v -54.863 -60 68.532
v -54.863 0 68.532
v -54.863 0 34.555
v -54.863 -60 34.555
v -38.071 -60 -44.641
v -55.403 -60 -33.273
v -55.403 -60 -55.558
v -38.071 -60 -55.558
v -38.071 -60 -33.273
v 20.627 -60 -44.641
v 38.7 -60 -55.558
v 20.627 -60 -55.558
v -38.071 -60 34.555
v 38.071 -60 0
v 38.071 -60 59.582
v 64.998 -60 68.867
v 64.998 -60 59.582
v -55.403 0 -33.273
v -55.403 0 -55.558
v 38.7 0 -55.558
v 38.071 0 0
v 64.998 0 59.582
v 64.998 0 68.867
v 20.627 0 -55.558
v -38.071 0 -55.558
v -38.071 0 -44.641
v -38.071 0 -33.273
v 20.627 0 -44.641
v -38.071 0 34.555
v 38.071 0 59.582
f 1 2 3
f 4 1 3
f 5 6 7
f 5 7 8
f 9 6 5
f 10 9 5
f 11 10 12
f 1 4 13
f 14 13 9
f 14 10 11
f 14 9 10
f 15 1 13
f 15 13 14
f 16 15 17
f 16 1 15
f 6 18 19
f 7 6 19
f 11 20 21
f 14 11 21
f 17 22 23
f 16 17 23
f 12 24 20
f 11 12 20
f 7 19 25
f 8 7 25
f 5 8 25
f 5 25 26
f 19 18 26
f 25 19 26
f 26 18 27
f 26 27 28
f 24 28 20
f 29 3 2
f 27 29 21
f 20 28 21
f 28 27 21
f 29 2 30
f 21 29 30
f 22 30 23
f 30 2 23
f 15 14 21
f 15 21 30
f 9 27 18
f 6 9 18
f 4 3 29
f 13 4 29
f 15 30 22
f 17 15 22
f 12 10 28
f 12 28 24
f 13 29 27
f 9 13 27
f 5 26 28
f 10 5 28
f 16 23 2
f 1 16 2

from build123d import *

# Parameters (mm, degrees)
F1_DEPTH = 60


with BuildPart() as f1:
    # F0 (on Front) → F1 (new body)
    with BuildSketch(Plane.XZ):
        Polygon((-38.070522, 0), (0, 0), (38.070526, 0), (38.070526, 59.581913), (64.998448, 59.581913), (64.998448, 68.867408), (-54.863341, 68.531811), (-54.863341, 34.555282), (-38.070522, 34.555282), align=None)
        Polygon((38.070526, 0), (0, 0), (-38.070522, 0), (-38.070522, -33.273019), (-55.403445, -33.273019), (-55.403445, -55.558201), (-38.070522, -55.558201), (-38.070522, -44.641409), (20.627134, -44.641409), (20.627134, -55.558201), (38.700473, -55.558201), align=None)
    extrude(amount=F1_DEPTH)


solid = f1.part
